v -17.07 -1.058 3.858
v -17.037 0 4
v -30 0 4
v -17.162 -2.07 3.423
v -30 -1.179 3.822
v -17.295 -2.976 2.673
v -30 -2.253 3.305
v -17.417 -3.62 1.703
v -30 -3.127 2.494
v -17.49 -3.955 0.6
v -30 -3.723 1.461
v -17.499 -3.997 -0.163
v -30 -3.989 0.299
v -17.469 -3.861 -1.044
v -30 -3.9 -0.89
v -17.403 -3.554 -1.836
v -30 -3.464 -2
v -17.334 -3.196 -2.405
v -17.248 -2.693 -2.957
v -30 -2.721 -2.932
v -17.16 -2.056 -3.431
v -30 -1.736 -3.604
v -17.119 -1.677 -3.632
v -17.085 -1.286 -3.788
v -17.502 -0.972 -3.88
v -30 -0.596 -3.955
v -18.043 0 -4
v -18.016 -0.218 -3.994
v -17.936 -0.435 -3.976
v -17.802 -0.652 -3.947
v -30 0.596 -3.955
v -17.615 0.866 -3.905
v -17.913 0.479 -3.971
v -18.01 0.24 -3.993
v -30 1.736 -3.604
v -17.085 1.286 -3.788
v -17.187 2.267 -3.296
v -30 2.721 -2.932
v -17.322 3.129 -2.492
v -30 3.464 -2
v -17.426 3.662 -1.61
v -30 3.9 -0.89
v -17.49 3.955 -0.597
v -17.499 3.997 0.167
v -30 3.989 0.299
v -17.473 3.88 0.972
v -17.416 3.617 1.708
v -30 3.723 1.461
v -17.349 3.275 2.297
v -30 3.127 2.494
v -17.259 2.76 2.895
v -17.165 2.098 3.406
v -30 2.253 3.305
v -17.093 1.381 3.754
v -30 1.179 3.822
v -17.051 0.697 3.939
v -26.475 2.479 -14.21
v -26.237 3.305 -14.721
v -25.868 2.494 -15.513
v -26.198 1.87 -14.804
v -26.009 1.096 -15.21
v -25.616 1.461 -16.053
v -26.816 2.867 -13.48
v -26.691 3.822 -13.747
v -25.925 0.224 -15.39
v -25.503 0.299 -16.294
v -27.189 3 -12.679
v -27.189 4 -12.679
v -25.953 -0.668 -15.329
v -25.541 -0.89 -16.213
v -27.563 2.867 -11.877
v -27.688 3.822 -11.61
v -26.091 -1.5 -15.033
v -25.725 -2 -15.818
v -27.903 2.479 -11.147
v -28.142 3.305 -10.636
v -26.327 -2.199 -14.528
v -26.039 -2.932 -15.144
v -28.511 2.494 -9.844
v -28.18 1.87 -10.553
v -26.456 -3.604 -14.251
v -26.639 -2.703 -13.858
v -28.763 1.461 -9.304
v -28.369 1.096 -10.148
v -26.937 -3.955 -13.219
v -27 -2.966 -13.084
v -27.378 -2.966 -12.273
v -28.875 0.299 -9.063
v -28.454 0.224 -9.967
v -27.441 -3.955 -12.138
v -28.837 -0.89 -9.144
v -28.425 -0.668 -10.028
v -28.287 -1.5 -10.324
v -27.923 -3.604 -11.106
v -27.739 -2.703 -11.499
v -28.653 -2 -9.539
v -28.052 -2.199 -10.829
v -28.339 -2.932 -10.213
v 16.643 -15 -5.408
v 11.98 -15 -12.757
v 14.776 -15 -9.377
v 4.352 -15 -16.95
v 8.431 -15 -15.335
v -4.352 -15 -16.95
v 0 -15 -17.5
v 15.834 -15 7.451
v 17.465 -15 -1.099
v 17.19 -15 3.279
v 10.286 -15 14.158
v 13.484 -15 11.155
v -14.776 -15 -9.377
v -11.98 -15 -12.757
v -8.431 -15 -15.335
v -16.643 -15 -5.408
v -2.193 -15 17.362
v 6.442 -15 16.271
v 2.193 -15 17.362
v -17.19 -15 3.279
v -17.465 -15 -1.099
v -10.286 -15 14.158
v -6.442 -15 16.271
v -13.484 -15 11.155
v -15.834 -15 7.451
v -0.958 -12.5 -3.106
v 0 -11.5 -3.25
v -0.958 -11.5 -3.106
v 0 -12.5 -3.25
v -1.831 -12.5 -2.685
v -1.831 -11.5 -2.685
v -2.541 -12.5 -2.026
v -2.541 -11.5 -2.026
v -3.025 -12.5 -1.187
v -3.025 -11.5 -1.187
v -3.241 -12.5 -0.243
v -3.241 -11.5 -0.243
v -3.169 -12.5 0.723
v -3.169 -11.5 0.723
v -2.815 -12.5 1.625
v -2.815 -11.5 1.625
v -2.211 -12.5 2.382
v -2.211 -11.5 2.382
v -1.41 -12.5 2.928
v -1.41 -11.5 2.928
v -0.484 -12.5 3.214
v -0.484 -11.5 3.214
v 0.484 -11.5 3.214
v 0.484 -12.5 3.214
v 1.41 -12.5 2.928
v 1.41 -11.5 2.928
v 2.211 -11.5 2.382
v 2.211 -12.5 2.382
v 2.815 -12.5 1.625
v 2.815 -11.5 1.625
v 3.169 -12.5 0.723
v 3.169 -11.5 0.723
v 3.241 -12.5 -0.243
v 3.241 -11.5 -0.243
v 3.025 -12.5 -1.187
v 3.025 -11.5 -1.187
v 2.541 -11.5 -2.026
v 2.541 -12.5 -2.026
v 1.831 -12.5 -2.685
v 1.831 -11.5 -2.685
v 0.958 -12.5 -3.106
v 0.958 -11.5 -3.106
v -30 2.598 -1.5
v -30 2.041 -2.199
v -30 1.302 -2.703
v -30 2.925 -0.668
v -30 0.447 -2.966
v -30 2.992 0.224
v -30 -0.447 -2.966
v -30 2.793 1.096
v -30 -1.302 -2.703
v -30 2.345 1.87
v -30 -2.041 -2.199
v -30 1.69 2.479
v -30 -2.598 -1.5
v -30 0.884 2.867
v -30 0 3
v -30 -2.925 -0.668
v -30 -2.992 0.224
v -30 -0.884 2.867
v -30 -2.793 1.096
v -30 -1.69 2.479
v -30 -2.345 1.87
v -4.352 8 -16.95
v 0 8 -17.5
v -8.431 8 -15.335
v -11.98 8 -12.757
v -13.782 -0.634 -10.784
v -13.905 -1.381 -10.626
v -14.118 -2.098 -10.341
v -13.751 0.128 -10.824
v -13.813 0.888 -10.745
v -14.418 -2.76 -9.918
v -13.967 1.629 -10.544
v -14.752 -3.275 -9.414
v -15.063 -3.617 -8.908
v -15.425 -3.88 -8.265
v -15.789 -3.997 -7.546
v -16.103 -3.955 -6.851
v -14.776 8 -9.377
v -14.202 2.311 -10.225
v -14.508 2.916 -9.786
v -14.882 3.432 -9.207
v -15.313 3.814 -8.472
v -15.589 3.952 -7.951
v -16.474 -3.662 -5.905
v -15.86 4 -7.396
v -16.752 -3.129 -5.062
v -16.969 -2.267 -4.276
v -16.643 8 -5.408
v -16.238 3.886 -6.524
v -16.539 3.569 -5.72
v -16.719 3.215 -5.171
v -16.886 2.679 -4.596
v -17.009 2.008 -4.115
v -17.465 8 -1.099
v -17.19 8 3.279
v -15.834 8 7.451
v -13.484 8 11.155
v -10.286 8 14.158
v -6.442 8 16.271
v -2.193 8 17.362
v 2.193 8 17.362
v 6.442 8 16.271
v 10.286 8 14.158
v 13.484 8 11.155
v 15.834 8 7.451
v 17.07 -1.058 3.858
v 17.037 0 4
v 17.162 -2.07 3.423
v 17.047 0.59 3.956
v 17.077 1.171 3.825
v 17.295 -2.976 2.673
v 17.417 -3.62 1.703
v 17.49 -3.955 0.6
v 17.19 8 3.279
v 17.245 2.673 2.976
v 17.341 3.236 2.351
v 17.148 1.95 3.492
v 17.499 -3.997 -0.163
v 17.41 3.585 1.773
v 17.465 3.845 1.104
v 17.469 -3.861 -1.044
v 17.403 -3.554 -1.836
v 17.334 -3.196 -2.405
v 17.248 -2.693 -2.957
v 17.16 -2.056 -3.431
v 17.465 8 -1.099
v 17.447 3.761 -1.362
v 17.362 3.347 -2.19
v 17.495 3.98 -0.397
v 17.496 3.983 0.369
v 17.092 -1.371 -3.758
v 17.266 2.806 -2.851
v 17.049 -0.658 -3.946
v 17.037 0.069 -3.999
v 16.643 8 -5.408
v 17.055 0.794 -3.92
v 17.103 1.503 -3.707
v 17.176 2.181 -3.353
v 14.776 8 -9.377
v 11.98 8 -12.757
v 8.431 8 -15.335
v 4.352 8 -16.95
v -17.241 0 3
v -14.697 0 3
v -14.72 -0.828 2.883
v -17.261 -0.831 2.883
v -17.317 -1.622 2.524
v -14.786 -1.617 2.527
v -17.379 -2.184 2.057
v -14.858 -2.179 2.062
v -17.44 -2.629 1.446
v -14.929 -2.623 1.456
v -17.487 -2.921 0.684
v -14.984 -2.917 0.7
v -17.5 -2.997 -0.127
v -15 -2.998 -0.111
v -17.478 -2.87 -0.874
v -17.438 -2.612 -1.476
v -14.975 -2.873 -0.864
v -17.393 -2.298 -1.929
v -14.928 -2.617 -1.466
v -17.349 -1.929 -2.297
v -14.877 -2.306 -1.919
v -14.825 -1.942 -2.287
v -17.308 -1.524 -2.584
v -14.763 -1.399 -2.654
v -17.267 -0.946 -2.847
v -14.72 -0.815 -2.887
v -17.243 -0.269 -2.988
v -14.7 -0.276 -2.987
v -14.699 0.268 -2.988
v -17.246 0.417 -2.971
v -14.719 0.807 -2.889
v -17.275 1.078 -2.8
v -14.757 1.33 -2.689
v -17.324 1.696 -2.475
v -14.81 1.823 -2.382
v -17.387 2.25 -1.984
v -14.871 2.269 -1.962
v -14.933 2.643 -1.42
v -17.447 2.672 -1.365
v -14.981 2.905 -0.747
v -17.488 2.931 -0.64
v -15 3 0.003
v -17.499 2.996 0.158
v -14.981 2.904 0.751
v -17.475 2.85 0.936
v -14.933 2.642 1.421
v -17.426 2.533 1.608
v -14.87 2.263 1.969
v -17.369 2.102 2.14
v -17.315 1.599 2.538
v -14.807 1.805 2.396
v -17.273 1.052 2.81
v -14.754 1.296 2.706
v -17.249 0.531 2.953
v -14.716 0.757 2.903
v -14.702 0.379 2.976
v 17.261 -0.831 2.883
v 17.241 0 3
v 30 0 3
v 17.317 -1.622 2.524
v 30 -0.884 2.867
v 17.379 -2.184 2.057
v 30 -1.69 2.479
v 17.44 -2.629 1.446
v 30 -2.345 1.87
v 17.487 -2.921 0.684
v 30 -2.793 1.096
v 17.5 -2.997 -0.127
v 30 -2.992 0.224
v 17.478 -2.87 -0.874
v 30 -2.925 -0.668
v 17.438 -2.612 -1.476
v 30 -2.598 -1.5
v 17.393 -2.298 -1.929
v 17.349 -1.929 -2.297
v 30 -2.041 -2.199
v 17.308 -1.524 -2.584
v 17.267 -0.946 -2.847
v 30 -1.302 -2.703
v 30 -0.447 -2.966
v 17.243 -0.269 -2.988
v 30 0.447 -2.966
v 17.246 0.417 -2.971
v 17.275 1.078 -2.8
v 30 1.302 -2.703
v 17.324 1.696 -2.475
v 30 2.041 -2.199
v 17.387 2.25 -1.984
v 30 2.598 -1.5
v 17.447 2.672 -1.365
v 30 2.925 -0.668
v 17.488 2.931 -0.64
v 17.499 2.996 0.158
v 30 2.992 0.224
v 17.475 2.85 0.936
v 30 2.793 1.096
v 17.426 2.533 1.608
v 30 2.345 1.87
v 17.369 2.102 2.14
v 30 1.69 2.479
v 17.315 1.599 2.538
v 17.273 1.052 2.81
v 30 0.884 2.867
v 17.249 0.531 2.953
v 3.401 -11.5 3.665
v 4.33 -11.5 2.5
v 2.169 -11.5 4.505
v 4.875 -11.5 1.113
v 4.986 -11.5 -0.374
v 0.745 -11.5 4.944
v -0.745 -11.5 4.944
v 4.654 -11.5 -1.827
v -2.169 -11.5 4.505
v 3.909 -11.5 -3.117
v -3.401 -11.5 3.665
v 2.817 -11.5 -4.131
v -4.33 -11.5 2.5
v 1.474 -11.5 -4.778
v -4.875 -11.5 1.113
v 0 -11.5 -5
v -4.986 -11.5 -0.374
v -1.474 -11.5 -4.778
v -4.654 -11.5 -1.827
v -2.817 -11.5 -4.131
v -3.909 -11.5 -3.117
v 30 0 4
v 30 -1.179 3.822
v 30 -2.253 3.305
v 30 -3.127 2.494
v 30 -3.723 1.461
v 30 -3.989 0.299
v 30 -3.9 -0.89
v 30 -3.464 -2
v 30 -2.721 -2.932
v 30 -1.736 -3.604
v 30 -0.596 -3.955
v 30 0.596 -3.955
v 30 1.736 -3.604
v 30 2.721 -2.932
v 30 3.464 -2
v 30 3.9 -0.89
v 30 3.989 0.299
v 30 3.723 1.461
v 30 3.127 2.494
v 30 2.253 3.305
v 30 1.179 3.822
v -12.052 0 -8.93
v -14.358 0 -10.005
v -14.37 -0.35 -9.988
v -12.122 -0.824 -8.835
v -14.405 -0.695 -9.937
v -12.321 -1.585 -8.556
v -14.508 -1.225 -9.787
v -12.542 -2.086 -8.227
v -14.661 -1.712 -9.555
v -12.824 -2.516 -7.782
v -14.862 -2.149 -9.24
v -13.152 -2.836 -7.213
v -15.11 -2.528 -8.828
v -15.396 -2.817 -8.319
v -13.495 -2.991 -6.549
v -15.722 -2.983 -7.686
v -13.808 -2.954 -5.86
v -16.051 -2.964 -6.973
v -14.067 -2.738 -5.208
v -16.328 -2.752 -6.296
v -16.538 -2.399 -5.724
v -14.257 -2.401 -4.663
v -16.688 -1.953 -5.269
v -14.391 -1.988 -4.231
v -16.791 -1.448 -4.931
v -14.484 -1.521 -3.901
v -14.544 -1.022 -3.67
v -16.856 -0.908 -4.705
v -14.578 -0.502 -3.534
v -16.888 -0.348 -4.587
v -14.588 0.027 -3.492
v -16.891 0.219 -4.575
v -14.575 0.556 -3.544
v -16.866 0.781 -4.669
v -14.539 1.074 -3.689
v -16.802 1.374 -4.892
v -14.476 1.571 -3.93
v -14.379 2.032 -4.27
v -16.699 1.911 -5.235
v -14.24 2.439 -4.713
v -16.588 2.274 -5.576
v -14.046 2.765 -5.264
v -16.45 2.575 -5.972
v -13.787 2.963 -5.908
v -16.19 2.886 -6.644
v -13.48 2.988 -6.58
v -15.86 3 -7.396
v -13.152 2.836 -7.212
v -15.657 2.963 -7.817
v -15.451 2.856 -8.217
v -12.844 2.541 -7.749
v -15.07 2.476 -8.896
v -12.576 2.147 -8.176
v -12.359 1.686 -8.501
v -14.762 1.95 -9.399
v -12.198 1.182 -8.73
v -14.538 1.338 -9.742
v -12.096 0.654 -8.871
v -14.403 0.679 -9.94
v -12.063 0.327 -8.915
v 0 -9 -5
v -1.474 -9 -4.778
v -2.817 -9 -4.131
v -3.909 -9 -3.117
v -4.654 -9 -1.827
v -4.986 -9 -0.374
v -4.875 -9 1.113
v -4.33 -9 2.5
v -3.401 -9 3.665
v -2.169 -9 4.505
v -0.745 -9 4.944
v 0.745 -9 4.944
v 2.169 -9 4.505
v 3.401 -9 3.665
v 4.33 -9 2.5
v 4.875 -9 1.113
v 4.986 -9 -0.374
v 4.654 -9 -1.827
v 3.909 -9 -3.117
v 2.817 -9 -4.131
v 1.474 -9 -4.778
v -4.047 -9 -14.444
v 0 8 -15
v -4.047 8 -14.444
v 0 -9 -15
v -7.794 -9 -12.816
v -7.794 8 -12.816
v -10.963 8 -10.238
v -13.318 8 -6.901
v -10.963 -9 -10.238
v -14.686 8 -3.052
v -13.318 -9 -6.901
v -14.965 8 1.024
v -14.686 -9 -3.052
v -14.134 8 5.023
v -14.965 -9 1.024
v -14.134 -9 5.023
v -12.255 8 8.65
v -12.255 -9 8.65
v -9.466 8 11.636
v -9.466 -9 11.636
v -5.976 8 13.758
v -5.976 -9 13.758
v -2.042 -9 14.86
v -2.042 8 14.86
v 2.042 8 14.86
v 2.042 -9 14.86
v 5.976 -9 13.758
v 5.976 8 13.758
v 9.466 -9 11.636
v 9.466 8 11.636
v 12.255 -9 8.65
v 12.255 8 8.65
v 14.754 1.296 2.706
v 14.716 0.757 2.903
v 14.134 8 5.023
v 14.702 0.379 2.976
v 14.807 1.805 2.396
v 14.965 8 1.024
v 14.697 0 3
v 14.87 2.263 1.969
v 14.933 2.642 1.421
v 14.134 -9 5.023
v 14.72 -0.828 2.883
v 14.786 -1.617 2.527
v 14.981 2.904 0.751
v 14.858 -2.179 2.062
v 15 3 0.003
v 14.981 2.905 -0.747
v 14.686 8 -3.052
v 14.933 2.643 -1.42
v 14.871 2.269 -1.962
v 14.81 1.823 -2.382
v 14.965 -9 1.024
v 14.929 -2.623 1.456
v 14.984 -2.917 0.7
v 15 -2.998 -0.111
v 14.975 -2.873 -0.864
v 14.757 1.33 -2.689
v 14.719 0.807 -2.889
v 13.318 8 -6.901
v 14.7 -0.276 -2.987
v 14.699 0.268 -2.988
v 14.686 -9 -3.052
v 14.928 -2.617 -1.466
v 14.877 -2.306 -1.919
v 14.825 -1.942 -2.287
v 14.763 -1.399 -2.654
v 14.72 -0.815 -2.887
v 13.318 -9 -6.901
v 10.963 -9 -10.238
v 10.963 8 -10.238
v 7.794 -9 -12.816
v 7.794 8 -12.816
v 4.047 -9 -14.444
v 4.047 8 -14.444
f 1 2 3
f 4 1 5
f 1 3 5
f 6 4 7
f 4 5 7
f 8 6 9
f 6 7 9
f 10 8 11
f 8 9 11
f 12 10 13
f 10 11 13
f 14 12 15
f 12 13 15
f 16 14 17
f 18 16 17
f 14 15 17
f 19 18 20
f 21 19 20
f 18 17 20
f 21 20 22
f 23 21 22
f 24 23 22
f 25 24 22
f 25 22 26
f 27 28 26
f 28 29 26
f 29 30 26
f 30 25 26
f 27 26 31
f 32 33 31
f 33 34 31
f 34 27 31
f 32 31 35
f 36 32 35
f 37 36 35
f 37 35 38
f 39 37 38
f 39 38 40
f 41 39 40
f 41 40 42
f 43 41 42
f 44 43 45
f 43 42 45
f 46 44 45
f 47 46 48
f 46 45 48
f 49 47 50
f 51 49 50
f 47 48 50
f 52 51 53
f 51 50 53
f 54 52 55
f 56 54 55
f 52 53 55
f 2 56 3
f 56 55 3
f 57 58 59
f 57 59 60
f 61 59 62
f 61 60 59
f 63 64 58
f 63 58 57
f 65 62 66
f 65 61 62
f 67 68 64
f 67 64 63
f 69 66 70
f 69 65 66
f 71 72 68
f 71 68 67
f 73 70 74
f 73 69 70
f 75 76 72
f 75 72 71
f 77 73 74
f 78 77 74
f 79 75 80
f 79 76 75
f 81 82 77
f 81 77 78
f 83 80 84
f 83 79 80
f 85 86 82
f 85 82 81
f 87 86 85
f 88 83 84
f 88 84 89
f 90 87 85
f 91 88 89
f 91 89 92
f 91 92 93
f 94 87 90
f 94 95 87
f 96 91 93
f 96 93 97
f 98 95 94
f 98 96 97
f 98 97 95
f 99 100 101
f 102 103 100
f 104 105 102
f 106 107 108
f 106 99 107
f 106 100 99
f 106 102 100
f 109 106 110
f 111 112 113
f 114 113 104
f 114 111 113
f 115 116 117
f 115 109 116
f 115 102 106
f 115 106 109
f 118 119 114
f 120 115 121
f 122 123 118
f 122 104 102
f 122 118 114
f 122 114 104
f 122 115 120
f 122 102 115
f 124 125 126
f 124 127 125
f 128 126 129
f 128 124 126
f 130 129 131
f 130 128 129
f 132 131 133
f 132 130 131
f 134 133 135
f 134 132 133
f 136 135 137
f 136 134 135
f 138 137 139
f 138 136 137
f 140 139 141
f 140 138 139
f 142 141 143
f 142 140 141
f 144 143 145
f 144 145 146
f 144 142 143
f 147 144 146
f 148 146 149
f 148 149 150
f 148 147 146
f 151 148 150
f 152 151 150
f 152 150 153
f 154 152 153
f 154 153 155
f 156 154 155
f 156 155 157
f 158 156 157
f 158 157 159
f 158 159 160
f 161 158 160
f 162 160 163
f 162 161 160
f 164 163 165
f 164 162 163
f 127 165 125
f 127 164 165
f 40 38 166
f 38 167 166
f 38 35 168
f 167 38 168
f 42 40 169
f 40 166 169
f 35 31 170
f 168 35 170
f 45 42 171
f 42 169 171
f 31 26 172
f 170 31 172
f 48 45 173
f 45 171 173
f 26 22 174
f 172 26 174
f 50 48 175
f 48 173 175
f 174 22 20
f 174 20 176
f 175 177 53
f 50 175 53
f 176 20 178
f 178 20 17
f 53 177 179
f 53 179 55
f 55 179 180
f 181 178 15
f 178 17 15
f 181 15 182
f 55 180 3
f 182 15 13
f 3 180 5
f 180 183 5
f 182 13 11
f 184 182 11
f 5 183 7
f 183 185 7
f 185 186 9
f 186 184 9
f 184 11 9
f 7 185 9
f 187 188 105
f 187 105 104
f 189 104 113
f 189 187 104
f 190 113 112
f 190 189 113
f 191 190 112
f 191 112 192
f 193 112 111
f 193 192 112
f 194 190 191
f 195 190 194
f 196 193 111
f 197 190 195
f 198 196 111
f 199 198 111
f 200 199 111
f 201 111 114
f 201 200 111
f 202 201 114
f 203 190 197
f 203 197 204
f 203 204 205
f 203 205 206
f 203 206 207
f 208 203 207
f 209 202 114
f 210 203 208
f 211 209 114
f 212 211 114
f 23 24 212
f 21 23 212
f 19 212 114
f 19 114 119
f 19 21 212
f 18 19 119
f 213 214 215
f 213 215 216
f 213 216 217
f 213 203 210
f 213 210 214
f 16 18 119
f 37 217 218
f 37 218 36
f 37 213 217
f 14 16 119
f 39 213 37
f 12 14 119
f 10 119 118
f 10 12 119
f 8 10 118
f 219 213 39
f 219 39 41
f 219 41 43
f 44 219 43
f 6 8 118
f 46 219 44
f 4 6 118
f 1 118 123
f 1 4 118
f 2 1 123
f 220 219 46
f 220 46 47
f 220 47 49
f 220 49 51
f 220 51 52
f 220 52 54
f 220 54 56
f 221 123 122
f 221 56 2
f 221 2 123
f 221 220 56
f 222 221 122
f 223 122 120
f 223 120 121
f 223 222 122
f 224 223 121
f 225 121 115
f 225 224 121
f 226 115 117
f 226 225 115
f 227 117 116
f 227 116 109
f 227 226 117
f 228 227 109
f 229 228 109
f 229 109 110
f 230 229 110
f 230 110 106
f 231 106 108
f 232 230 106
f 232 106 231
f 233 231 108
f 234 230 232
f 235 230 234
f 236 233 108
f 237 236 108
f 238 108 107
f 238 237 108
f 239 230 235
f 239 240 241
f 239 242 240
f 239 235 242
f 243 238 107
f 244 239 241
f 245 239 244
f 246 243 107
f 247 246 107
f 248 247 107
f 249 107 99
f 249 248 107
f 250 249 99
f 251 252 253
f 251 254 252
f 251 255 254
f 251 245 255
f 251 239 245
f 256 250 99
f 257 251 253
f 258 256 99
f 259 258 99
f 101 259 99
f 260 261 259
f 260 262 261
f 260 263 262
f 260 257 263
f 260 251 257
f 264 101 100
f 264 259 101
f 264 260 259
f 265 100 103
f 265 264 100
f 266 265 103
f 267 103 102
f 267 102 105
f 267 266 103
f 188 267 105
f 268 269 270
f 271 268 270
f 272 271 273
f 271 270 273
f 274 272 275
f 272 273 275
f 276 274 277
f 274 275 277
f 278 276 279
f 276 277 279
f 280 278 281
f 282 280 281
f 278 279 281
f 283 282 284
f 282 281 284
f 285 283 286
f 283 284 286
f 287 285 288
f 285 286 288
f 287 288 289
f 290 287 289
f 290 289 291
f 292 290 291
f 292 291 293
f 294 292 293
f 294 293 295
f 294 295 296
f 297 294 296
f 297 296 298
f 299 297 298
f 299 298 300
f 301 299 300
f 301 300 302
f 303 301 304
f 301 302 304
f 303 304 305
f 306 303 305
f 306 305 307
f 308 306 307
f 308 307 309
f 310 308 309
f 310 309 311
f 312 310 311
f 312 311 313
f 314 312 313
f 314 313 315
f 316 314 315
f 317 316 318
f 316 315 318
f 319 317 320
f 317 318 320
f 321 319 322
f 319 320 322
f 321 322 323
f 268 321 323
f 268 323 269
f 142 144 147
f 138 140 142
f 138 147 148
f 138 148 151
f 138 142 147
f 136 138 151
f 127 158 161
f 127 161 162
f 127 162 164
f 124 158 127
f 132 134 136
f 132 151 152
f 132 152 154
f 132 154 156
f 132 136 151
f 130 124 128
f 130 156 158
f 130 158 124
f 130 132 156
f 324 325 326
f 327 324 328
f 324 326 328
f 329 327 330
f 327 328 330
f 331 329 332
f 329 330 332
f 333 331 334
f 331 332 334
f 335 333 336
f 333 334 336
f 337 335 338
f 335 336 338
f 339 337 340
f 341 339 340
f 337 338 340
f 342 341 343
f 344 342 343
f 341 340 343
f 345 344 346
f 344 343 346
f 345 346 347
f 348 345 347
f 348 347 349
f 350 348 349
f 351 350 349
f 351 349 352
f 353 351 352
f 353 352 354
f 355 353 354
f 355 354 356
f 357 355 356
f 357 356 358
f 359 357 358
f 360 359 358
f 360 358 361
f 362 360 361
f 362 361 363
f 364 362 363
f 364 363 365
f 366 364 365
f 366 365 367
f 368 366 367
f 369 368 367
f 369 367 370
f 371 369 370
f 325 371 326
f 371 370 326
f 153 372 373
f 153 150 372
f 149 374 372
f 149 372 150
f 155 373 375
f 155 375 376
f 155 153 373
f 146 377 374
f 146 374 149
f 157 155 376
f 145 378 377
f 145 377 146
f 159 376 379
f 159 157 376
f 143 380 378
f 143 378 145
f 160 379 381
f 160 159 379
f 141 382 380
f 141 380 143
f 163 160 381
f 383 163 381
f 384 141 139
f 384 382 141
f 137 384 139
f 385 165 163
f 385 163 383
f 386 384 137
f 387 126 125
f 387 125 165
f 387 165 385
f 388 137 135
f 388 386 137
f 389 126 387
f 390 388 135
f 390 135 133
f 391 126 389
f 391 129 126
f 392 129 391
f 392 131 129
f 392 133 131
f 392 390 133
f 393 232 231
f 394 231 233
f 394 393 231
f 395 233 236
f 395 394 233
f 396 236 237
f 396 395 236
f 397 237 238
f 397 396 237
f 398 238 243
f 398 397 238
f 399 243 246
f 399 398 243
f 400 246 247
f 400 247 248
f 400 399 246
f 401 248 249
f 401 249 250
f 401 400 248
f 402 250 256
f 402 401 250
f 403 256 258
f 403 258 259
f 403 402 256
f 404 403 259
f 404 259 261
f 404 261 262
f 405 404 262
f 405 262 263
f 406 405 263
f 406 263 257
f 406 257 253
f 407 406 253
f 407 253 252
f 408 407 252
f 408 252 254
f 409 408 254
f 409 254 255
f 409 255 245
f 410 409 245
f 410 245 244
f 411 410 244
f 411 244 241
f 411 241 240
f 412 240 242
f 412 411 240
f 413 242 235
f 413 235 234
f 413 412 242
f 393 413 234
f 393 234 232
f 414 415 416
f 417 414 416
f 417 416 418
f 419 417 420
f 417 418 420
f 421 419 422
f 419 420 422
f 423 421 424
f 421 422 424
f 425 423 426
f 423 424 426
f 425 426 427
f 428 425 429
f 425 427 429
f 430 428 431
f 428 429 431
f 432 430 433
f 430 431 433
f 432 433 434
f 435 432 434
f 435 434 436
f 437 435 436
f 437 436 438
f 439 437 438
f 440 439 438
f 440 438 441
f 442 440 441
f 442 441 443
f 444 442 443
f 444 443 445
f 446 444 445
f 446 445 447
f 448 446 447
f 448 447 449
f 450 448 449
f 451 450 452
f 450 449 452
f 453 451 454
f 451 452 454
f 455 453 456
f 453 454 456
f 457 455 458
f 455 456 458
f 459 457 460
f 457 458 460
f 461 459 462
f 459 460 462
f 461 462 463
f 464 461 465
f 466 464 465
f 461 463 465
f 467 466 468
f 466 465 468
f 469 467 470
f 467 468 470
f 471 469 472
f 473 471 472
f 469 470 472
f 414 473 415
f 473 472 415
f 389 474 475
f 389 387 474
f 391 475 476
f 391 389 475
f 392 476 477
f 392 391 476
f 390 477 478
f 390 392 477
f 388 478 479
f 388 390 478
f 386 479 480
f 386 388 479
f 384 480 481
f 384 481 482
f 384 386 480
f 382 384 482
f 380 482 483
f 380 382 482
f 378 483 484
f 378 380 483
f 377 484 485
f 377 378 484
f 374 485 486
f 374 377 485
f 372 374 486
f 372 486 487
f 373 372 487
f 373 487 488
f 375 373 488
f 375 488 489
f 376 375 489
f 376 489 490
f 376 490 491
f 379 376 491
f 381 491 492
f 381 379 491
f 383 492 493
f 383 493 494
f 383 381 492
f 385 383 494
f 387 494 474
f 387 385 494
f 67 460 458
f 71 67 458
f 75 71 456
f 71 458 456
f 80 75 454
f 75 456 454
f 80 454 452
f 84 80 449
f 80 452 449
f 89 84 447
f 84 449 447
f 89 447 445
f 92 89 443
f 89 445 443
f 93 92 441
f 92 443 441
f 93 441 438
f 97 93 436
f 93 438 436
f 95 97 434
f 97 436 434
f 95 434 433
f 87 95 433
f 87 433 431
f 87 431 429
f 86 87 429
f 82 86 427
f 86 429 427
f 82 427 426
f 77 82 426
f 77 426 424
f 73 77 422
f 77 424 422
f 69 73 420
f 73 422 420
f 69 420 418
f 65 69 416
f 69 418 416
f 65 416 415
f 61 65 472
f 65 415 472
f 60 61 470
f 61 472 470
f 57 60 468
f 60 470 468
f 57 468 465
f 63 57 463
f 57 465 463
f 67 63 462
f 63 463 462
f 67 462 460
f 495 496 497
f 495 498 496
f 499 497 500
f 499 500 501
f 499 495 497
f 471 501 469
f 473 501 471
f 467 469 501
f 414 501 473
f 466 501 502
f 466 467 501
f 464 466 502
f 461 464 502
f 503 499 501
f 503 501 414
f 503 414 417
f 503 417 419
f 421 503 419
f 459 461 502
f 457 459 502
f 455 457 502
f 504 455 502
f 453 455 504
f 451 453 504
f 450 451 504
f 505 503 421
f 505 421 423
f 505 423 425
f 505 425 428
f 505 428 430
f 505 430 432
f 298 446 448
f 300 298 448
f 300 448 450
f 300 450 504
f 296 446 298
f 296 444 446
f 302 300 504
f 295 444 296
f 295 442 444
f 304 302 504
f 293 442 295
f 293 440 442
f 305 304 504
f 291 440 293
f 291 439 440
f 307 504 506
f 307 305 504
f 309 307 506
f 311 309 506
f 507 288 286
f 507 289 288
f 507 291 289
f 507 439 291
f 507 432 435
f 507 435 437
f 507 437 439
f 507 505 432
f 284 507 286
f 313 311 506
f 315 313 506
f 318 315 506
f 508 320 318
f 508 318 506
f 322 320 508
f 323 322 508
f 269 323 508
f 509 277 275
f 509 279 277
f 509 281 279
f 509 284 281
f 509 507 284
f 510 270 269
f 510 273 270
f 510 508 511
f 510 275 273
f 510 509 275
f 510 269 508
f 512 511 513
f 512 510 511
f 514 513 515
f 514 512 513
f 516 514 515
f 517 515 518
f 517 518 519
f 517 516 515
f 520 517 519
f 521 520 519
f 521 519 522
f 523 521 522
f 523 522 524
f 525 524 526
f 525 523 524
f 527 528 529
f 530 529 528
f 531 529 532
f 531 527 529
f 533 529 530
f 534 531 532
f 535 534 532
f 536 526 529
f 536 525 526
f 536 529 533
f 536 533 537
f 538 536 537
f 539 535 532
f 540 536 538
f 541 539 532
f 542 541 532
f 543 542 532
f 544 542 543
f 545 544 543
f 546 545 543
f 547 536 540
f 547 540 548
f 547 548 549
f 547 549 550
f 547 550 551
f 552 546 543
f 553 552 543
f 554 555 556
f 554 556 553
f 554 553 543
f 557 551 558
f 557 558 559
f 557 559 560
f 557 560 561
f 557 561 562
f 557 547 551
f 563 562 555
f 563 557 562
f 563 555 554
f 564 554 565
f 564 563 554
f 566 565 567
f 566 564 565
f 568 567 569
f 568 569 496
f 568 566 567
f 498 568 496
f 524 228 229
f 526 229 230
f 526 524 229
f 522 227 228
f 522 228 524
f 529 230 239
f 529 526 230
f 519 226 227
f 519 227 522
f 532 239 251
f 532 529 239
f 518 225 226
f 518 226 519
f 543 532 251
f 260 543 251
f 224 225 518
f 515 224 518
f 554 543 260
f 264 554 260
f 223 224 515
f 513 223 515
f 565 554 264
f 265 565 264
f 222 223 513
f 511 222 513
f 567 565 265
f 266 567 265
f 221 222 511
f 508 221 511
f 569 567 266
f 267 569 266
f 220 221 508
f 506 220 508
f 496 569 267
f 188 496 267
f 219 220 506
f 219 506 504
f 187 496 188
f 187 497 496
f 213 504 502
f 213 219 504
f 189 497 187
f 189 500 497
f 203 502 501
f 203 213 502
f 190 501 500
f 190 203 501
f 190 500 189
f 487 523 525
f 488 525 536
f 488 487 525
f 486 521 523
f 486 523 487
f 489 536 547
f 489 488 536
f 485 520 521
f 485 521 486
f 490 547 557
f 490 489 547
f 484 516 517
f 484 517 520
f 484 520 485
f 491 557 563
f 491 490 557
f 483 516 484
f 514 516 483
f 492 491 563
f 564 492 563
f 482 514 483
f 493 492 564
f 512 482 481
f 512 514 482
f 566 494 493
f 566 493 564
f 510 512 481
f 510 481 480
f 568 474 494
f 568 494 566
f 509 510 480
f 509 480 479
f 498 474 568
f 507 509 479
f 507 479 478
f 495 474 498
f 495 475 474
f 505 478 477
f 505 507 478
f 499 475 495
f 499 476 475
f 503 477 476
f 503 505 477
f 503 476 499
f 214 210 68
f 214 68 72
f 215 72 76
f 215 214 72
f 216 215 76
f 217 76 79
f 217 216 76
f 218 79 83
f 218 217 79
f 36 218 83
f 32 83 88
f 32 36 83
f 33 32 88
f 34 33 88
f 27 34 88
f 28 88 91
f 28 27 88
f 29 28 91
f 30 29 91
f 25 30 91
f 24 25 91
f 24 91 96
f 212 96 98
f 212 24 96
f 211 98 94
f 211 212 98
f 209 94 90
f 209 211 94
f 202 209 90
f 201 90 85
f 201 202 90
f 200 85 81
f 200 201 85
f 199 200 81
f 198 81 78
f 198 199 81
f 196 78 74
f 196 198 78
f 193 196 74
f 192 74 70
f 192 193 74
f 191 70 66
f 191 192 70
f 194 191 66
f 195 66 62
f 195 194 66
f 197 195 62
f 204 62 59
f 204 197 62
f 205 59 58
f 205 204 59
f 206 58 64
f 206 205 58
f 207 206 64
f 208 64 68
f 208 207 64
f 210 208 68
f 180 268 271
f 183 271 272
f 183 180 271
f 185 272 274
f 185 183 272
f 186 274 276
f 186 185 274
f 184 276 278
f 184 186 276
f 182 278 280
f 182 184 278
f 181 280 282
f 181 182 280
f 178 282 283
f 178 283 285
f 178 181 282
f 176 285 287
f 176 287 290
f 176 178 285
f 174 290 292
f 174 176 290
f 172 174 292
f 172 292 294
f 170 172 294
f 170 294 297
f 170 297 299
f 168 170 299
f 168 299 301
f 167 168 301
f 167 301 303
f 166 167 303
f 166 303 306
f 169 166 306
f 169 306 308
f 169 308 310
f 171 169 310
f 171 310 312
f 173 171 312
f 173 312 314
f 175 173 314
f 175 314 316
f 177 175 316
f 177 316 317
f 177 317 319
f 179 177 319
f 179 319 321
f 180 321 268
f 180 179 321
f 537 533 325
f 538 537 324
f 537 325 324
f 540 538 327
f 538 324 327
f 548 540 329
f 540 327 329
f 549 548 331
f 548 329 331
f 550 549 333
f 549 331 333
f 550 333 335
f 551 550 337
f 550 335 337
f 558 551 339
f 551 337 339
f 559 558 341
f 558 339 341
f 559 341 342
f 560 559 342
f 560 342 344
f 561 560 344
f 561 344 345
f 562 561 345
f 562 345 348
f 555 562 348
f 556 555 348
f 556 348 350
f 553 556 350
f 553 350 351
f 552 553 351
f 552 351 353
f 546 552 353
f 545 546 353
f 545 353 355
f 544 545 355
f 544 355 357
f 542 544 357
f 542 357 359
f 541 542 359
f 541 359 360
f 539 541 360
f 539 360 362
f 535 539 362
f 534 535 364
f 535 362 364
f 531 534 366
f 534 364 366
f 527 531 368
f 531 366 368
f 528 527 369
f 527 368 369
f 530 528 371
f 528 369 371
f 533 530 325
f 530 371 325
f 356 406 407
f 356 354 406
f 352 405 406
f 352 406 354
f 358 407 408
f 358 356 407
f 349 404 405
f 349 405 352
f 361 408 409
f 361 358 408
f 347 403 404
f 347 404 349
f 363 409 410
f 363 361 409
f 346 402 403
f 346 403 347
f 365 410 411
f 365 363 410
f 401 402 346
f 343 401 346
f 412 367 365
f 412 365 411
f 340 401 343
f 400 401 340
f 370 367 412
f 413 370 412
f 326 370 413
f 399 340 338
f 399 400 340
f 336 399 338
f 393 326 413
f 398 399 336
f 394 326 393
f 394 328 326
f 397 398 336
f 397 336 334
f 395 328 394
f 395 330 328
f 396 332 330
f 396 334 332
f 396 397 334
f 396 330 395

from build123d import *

# Parameters (mm, degrees)
FUROS_GUIA_COM_6_0MM1_D       = 6
FUROS_GUIA_COM_6_0MM2_REACH   = 46.246
FUROS_GUIA_COM_6_0MM2_BORE_R  = 3
RESSALTO_EXTRUS_O1_REACH      = 60.94
RESSALTO_EXTRUS_O1_END_RADIUS = 17.5
RESSALTO_EXTRUS_O1_START      = -30
ESBO_O4_R                     = 4
ESBO_O4_R_2                   = 3
RESSALTO_EXTRUS_O2_OUTLINE_W  = 1
RESSALTO_EXTRUS_O2_OUTLINE_H  = 12.963481803


# Read off the part's stored shape, not the designer's step: Ressalto-extrusão2
with BuildPart() as part:
    # Esboço1 → Revolução1 (revolve)
    with BuildSketch(Plane.XY, mode=Mode.PRIVATE) as revolu_o1_sk:
        Polygon((0, -15), (17.5, -15), (17.5, 8), (15, 8), (15, -9), (5, -9), (5, -11.5), (3.25, -11.5), (3.25, -12.5), (0, -12.5), align=None)
    revolve(revolu_o1_sk.sketch.rotate(Axis((0, 0, 0), (0, 1, 0)), 90), axis=Axis((0, 0, 0), (0, 1, 0)))

    # Furos-guia com Ø6.0mm1 (through all)
    with Locations(Plane(origin=(-17.5, 0, 0), x_dir=(0, 0, -1), z_dir=(-1, 0, 0))):
        with Locations((0, 0)):
            Hole(FUROS_GUIA_COM_6_0MM1_D / 2)

    # Furos-guia com Ø6.0mm2 bore (on position points) → Furos-guia com Ø6.0mm2 (cut, up to next)
    with BuildSketch(Plane(origin=(-15.860386273, 0, -7.39581958), x_dir=(0.422618261741, 0, -0.906307787037), z_dir=(-0.906307787037, 0, -0.422618261741)), mode=Mode.PRIVATE) as furos_guia_com_6_0mm2_sk1:
        Circle(FUROS_GUIA_COM_6_0MM2_BORE_R)
    furos_guia_com_6_0mm2_tool1 = extrude(furos_guia_com_6_0mm2_sk1.sketch, amount=-FUROS_GUIA_COM_6_0MM2_REACH, mode=Mode.PRIVATE) & part.part
    add(furos_guia_com_6_0mm2_tool1.solids().sort_by_distance((-15.860386, 0, -7.39582))[0], mode=Mode.SUBTRACT)

    # Ressalto-extrusão1: up to this cylinder (the profile starts outside it)
    ressalto_extrus_o1_end = Plane(origin=(0, 0, 0), z_dir=(0, -1, 0)) * Cylinder(RESSALTO_EXTRUS_O1_END_RADIUS, 157.88, mode=Mode.PRIVATE)
    # Esboço4 → Ressalto-extrusão1 (add, up to the surface)
    with BuildSketch(Plane(origin=(0, 0, 0), x_dir=(0, 0, -1), z_dir=(1, 0, 0)).offset(RESSALTO_EXTRUS_O1_START), mode=Mode.PRIVATE) as ressalto_extrus_o1_sk1:
        with Locations(Location((0, 0, 0), (0, 0, 180))):
            Circle(ESBO_O4_R)
        with Locations(Location((0, 0, 0), (0, 0, 180))):
            Circle(ESBO_O4_R_2, mode=Mode.SUBTRACT)
    ressalto_extrus_o1_tool1 = extrude(ressalto_extrus_o1_sk1.sketch, amount=RESSALTO_EXTRUS_O1_REACH, mode=Mode.PRIVATE) - ressalto_extrus_o1_end
    ressalto_extrus_o1 = ressalto_extrus_o1_tool1.solids().sort_by_distance((-30, 0, -3.886863))[0]
    add(ressalto_extrus_o1)

    # Espelhar3: Ressalto-extrusão1 across plane
    add(ressalto_extrus_o1.mirror(Plane(origin=(0, 0, 0), x_dir=(0, 0, 1), z_dir=(1, 0, 0))))

    # Ressalto-extrusão2 outline → Ressalto-extrusão2 (revolve)
    with BuildSketch(Plane(origin=(0, 0, 0), x_dir=(0, 1, 0), z_dir=(0.4226182617407003, 0, -0.9063077870366496))):
        with Locations((3.5, -23.518259099)):
            Rectangle(RESSALTO_EXTRUS_O2_OUTLINE_W, RESSALTO_EXTRUS_O2_OUTLINE_H)
    revolve(axis=Axis((0, 0, 0), (0.9063077870366496, 0, 0.4226182617407003)))


solid = part.part
